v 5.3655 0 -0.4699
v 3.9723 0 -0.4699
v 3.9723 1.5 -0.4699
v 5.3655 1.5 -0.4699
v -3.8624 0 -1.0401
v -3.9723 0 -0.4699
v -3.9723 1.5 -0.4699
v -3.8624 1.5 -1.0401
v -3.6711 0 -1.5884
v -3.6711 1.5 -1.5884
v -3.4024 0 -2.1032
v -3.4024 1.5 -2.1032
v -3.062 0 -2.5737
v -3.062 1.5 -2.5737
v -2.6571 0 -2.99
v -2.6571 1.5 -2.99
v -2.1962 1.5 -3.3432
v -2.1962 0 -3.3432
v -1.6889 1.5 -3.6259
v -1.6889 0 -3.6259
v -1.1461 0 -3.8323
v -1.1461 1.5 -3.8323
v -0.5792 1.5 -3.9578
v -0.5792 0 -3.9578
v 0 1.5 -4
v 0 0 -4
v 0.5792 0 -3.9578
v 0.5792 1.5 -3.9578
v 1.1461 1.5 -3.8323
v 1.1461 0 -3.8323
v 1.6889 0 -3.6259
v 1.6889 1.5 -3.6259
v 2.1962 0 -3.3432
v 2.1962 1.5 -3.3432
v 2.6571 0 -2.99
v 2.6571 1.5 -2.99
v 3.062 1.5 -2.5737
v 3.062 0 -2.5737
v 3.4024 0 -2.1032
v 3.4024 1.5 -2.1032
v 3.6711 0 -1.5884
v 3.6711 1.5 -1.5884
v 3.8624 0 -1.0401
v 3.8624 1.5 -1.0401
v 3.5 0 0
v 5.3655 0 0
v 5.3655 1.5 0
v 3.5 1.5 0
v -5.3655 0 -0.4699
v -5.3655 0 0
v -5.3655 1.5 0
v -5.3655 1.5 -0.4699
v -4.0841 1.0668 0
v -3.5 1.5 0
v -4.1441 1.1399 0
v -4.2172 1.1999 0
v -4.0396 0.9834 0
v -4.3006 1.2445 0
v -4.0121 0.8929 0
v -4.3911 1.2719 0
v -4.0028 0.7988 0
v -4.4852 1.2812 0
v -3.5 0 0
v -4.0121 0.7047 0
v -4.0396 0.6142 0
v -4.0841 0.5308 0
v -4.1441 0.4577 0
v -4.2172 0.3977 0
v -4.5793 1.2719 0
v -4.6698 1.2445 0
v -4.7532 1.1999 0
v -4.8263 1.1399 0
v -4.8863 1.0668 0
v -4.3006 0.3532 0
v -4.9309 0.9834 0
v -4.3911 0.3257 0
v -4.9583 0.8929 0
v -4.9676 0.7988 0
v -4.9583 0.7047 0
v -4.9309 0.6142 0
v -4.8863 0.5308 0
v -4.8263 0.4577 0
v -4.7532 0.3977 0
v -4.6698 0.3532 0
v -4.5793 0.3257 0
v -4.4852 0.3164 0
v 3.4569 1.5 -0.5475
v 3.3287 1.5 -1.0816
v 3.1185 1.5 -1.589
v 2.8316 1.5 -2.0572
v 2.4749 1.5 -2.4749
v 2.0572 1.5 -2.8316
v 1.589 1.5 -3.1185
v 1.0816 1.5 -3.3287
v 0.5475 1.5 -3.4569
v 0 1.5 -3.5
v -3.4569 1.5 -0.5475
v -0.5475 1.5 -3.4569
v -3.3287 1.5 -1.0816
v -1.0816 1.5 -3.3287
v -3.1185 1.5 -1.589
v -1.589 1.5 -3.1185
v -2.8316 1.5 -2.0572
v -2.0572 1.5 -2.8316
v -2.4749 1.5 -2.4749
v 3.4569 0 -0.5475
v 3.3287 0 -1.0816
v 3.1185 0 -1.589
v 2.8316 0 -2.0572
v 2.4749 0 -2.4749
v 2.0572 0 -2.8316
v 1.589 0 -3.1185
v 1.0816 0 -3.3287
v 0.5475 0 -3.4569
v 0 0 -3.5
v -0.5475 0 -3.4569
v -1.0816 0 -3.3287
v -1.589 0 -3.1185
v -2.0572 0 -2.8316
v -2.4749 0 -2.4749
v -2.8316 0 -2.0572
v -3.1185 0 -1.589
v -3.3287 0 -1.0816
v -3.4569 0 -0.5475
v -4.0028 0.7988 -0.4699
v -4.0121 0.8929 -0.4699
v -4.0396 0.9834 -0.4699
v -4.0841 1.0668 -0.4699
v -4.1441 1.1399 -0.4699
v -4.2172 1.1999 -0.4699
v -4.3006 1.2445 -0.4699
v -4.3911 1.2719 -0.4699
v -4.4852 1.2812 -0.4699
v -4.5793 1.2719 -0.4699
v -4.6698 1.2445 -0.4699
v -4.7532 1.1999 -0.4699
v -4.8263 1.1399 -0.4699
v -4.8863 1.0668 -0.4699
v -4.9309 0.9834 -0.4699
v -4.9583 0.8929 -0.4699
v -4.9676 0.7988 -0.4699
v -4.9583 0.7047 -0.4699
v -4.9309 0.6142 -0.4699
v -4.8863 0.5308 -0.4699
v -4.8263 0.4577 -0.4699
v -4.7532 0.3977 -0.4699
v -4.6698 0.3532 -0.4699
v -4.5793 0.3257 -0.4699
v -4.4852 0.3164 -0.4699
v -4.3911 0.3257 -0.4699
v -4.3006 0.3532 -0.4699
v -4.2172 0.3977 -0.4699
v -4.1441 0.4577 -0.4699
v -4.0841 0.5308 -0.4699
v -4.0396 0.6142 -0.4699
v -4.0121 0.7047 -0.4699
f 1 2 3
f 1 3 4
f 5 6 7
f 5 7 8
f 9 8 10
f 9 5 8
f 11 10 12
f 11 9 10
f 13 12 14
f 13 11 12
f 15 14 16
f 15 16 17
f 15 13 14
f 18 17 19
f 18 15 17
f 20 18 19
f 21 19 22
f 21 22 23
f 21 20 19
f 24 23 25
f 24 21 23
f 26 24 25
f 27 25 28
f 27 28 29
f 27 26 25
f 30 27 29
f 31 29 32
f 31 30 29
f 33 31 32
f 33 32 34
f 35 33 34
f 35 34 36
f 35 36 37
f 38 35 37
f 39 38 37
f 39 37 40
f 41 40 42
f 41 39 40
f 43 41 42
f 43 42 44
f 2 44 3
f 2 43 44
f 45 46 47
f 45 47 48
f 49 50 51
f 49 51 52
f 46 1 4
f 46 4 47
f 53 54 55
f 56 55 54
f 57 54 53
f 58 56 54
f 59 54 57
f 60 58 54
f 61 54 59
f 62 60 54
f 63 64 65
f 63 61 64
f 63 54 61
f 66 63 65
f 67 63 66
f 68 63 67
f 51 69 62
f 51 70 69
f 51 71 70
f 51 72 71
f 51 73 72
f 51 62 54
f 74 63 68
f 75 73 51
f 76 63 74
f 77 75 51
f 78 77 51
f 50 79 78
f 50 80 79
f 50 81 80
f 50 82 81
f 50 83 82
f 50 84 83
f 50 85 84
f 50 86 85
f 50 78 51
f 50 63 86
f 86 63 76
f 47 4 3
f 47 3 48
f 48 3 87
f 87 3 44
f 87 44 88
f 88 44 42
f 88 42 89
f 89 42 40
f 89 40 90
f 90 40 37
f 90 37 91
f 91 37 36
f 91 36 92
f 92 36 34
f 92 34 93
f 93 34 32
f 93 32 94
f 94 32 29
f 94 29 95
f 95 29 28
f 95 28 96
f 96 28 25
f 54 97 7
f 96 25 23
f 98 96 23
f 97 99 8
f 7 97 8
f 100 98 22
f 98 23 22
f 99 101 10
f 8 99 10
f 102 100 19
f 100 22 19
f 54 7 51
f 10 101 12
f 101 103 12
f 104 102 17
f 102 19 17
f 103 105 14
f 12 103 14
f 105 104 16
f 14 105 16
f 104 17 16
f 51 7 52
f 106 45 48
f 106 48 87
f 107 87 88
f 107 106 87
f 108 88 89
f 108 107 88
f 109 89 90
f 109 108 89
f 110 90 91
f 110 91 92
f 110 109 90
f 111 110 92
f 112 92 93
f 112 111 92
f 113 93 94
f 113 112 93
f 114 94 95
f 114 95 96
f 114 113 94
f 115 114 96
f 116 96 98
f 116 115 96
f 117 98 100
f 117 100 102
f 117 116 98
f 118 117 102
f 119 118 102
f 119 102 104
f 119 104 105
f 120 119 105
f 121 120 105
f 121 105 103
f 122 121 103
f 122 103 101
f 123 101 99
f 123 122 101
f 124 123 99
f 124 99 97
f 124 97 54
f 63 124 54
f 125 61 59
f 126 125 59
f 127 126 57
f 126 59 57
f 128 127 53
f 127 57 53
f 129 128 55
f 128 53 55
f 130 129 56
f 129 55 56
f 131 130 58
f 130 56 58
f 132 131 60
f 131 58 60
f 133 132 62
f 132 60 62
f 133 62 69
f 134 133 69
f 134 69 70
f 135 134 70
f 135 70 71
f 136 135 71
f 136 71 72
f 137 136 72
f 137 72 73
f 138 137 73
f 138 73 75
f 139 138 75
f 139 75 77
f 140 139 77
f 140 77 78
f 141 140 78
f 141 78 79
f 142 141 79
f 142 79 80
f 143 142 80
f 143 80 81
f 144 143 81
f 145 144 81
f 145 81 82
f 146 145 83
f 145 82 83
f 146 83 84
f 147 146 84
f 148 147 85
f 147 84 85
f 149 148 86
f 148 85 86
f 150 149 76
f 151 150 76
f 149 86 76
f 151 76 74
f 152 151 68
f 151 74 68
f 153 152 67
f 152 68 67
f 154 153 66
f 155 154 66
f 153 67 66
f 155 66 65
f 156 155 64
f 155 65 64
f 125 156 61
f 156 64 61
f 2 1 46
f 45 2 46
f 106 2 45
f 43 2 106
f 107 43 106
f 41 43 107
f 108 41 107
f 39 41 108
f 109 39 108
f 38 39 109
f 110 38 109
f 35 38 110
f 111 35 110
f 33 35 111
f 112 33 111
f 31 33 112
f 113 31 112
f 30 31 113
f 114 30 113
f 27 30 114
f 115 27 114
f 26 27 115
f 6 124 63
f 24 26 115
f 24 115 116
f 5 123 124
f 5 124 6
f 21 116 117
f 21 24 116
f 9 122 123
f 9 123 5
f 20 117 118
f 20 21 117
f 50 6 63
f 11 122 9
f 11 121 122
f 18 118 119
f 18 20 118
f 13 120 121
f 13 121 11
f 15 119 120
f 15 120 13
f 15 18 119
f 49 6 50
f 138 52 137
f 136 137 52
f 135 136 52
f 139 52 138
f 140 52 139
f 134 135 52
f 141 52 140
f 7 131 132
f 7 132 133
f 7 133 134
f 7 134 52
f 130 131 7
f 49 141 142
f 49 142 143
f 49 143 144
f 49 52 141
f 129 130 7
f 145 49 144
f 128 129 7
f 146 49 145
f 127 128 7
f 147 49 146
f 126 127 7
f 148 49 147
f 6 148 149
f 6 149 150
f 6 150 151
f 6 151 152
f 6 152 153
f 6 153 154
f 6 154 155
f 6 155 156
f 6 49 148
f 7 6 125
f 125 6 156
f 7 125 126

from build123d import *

# Parameters (mm, degrees)
BOSS_EXTRUDE1_DEPTH = 1.5
SKETCH3_R           = 0.482388485
CUT_EXTRUDE1_DEPTH  = 0.47


with BuildPart() as part:
    # Sketch1 → Boss-Extrude1 (new body)
    with BuildSketch(Plane(origin=(0, 0, 0), x_dir=(1, 0, 0), z_dir=(0, 1, 0))):
        with BuildLine():
            Line((5.365482369, 0), (3.5, 0))
            ThreePointArc((3.5, 0), (0, 3.5), (-3.5, 0))
            Line((-3.5, 0), (-5.365482369, 0))
            Line((-5.365482369, 0), (-5.365482369, 0.469939432))
            Line((-5.365482369, 0.469939432), (-3.972298696, 0.469939432))
            ThreePointArc((-3.972298696, 0.469939432), (0, 4), (3.972298696, 0.469939432))
            Line((3.972298696, 0.469939432), (5.365482369, 0.469939432))
            Line((5.365482369, 0.469939432), (5.365482369, 0))
        make_face()
    extrude(amount=BOSS_EXTRUDE1_DEPTH)

    # Sketch3 → Cut-Extrude1 (cut)
    with BuildSketch(Plane.XY):
        with Locations((-4.485222017, 0.798824848)):
            Circle(SKETCH3_R)
    extrude(amount=-CUT_EXTRUDE1_DEPTH, mode=Mode.SUBTRACT)


solid = part.part
